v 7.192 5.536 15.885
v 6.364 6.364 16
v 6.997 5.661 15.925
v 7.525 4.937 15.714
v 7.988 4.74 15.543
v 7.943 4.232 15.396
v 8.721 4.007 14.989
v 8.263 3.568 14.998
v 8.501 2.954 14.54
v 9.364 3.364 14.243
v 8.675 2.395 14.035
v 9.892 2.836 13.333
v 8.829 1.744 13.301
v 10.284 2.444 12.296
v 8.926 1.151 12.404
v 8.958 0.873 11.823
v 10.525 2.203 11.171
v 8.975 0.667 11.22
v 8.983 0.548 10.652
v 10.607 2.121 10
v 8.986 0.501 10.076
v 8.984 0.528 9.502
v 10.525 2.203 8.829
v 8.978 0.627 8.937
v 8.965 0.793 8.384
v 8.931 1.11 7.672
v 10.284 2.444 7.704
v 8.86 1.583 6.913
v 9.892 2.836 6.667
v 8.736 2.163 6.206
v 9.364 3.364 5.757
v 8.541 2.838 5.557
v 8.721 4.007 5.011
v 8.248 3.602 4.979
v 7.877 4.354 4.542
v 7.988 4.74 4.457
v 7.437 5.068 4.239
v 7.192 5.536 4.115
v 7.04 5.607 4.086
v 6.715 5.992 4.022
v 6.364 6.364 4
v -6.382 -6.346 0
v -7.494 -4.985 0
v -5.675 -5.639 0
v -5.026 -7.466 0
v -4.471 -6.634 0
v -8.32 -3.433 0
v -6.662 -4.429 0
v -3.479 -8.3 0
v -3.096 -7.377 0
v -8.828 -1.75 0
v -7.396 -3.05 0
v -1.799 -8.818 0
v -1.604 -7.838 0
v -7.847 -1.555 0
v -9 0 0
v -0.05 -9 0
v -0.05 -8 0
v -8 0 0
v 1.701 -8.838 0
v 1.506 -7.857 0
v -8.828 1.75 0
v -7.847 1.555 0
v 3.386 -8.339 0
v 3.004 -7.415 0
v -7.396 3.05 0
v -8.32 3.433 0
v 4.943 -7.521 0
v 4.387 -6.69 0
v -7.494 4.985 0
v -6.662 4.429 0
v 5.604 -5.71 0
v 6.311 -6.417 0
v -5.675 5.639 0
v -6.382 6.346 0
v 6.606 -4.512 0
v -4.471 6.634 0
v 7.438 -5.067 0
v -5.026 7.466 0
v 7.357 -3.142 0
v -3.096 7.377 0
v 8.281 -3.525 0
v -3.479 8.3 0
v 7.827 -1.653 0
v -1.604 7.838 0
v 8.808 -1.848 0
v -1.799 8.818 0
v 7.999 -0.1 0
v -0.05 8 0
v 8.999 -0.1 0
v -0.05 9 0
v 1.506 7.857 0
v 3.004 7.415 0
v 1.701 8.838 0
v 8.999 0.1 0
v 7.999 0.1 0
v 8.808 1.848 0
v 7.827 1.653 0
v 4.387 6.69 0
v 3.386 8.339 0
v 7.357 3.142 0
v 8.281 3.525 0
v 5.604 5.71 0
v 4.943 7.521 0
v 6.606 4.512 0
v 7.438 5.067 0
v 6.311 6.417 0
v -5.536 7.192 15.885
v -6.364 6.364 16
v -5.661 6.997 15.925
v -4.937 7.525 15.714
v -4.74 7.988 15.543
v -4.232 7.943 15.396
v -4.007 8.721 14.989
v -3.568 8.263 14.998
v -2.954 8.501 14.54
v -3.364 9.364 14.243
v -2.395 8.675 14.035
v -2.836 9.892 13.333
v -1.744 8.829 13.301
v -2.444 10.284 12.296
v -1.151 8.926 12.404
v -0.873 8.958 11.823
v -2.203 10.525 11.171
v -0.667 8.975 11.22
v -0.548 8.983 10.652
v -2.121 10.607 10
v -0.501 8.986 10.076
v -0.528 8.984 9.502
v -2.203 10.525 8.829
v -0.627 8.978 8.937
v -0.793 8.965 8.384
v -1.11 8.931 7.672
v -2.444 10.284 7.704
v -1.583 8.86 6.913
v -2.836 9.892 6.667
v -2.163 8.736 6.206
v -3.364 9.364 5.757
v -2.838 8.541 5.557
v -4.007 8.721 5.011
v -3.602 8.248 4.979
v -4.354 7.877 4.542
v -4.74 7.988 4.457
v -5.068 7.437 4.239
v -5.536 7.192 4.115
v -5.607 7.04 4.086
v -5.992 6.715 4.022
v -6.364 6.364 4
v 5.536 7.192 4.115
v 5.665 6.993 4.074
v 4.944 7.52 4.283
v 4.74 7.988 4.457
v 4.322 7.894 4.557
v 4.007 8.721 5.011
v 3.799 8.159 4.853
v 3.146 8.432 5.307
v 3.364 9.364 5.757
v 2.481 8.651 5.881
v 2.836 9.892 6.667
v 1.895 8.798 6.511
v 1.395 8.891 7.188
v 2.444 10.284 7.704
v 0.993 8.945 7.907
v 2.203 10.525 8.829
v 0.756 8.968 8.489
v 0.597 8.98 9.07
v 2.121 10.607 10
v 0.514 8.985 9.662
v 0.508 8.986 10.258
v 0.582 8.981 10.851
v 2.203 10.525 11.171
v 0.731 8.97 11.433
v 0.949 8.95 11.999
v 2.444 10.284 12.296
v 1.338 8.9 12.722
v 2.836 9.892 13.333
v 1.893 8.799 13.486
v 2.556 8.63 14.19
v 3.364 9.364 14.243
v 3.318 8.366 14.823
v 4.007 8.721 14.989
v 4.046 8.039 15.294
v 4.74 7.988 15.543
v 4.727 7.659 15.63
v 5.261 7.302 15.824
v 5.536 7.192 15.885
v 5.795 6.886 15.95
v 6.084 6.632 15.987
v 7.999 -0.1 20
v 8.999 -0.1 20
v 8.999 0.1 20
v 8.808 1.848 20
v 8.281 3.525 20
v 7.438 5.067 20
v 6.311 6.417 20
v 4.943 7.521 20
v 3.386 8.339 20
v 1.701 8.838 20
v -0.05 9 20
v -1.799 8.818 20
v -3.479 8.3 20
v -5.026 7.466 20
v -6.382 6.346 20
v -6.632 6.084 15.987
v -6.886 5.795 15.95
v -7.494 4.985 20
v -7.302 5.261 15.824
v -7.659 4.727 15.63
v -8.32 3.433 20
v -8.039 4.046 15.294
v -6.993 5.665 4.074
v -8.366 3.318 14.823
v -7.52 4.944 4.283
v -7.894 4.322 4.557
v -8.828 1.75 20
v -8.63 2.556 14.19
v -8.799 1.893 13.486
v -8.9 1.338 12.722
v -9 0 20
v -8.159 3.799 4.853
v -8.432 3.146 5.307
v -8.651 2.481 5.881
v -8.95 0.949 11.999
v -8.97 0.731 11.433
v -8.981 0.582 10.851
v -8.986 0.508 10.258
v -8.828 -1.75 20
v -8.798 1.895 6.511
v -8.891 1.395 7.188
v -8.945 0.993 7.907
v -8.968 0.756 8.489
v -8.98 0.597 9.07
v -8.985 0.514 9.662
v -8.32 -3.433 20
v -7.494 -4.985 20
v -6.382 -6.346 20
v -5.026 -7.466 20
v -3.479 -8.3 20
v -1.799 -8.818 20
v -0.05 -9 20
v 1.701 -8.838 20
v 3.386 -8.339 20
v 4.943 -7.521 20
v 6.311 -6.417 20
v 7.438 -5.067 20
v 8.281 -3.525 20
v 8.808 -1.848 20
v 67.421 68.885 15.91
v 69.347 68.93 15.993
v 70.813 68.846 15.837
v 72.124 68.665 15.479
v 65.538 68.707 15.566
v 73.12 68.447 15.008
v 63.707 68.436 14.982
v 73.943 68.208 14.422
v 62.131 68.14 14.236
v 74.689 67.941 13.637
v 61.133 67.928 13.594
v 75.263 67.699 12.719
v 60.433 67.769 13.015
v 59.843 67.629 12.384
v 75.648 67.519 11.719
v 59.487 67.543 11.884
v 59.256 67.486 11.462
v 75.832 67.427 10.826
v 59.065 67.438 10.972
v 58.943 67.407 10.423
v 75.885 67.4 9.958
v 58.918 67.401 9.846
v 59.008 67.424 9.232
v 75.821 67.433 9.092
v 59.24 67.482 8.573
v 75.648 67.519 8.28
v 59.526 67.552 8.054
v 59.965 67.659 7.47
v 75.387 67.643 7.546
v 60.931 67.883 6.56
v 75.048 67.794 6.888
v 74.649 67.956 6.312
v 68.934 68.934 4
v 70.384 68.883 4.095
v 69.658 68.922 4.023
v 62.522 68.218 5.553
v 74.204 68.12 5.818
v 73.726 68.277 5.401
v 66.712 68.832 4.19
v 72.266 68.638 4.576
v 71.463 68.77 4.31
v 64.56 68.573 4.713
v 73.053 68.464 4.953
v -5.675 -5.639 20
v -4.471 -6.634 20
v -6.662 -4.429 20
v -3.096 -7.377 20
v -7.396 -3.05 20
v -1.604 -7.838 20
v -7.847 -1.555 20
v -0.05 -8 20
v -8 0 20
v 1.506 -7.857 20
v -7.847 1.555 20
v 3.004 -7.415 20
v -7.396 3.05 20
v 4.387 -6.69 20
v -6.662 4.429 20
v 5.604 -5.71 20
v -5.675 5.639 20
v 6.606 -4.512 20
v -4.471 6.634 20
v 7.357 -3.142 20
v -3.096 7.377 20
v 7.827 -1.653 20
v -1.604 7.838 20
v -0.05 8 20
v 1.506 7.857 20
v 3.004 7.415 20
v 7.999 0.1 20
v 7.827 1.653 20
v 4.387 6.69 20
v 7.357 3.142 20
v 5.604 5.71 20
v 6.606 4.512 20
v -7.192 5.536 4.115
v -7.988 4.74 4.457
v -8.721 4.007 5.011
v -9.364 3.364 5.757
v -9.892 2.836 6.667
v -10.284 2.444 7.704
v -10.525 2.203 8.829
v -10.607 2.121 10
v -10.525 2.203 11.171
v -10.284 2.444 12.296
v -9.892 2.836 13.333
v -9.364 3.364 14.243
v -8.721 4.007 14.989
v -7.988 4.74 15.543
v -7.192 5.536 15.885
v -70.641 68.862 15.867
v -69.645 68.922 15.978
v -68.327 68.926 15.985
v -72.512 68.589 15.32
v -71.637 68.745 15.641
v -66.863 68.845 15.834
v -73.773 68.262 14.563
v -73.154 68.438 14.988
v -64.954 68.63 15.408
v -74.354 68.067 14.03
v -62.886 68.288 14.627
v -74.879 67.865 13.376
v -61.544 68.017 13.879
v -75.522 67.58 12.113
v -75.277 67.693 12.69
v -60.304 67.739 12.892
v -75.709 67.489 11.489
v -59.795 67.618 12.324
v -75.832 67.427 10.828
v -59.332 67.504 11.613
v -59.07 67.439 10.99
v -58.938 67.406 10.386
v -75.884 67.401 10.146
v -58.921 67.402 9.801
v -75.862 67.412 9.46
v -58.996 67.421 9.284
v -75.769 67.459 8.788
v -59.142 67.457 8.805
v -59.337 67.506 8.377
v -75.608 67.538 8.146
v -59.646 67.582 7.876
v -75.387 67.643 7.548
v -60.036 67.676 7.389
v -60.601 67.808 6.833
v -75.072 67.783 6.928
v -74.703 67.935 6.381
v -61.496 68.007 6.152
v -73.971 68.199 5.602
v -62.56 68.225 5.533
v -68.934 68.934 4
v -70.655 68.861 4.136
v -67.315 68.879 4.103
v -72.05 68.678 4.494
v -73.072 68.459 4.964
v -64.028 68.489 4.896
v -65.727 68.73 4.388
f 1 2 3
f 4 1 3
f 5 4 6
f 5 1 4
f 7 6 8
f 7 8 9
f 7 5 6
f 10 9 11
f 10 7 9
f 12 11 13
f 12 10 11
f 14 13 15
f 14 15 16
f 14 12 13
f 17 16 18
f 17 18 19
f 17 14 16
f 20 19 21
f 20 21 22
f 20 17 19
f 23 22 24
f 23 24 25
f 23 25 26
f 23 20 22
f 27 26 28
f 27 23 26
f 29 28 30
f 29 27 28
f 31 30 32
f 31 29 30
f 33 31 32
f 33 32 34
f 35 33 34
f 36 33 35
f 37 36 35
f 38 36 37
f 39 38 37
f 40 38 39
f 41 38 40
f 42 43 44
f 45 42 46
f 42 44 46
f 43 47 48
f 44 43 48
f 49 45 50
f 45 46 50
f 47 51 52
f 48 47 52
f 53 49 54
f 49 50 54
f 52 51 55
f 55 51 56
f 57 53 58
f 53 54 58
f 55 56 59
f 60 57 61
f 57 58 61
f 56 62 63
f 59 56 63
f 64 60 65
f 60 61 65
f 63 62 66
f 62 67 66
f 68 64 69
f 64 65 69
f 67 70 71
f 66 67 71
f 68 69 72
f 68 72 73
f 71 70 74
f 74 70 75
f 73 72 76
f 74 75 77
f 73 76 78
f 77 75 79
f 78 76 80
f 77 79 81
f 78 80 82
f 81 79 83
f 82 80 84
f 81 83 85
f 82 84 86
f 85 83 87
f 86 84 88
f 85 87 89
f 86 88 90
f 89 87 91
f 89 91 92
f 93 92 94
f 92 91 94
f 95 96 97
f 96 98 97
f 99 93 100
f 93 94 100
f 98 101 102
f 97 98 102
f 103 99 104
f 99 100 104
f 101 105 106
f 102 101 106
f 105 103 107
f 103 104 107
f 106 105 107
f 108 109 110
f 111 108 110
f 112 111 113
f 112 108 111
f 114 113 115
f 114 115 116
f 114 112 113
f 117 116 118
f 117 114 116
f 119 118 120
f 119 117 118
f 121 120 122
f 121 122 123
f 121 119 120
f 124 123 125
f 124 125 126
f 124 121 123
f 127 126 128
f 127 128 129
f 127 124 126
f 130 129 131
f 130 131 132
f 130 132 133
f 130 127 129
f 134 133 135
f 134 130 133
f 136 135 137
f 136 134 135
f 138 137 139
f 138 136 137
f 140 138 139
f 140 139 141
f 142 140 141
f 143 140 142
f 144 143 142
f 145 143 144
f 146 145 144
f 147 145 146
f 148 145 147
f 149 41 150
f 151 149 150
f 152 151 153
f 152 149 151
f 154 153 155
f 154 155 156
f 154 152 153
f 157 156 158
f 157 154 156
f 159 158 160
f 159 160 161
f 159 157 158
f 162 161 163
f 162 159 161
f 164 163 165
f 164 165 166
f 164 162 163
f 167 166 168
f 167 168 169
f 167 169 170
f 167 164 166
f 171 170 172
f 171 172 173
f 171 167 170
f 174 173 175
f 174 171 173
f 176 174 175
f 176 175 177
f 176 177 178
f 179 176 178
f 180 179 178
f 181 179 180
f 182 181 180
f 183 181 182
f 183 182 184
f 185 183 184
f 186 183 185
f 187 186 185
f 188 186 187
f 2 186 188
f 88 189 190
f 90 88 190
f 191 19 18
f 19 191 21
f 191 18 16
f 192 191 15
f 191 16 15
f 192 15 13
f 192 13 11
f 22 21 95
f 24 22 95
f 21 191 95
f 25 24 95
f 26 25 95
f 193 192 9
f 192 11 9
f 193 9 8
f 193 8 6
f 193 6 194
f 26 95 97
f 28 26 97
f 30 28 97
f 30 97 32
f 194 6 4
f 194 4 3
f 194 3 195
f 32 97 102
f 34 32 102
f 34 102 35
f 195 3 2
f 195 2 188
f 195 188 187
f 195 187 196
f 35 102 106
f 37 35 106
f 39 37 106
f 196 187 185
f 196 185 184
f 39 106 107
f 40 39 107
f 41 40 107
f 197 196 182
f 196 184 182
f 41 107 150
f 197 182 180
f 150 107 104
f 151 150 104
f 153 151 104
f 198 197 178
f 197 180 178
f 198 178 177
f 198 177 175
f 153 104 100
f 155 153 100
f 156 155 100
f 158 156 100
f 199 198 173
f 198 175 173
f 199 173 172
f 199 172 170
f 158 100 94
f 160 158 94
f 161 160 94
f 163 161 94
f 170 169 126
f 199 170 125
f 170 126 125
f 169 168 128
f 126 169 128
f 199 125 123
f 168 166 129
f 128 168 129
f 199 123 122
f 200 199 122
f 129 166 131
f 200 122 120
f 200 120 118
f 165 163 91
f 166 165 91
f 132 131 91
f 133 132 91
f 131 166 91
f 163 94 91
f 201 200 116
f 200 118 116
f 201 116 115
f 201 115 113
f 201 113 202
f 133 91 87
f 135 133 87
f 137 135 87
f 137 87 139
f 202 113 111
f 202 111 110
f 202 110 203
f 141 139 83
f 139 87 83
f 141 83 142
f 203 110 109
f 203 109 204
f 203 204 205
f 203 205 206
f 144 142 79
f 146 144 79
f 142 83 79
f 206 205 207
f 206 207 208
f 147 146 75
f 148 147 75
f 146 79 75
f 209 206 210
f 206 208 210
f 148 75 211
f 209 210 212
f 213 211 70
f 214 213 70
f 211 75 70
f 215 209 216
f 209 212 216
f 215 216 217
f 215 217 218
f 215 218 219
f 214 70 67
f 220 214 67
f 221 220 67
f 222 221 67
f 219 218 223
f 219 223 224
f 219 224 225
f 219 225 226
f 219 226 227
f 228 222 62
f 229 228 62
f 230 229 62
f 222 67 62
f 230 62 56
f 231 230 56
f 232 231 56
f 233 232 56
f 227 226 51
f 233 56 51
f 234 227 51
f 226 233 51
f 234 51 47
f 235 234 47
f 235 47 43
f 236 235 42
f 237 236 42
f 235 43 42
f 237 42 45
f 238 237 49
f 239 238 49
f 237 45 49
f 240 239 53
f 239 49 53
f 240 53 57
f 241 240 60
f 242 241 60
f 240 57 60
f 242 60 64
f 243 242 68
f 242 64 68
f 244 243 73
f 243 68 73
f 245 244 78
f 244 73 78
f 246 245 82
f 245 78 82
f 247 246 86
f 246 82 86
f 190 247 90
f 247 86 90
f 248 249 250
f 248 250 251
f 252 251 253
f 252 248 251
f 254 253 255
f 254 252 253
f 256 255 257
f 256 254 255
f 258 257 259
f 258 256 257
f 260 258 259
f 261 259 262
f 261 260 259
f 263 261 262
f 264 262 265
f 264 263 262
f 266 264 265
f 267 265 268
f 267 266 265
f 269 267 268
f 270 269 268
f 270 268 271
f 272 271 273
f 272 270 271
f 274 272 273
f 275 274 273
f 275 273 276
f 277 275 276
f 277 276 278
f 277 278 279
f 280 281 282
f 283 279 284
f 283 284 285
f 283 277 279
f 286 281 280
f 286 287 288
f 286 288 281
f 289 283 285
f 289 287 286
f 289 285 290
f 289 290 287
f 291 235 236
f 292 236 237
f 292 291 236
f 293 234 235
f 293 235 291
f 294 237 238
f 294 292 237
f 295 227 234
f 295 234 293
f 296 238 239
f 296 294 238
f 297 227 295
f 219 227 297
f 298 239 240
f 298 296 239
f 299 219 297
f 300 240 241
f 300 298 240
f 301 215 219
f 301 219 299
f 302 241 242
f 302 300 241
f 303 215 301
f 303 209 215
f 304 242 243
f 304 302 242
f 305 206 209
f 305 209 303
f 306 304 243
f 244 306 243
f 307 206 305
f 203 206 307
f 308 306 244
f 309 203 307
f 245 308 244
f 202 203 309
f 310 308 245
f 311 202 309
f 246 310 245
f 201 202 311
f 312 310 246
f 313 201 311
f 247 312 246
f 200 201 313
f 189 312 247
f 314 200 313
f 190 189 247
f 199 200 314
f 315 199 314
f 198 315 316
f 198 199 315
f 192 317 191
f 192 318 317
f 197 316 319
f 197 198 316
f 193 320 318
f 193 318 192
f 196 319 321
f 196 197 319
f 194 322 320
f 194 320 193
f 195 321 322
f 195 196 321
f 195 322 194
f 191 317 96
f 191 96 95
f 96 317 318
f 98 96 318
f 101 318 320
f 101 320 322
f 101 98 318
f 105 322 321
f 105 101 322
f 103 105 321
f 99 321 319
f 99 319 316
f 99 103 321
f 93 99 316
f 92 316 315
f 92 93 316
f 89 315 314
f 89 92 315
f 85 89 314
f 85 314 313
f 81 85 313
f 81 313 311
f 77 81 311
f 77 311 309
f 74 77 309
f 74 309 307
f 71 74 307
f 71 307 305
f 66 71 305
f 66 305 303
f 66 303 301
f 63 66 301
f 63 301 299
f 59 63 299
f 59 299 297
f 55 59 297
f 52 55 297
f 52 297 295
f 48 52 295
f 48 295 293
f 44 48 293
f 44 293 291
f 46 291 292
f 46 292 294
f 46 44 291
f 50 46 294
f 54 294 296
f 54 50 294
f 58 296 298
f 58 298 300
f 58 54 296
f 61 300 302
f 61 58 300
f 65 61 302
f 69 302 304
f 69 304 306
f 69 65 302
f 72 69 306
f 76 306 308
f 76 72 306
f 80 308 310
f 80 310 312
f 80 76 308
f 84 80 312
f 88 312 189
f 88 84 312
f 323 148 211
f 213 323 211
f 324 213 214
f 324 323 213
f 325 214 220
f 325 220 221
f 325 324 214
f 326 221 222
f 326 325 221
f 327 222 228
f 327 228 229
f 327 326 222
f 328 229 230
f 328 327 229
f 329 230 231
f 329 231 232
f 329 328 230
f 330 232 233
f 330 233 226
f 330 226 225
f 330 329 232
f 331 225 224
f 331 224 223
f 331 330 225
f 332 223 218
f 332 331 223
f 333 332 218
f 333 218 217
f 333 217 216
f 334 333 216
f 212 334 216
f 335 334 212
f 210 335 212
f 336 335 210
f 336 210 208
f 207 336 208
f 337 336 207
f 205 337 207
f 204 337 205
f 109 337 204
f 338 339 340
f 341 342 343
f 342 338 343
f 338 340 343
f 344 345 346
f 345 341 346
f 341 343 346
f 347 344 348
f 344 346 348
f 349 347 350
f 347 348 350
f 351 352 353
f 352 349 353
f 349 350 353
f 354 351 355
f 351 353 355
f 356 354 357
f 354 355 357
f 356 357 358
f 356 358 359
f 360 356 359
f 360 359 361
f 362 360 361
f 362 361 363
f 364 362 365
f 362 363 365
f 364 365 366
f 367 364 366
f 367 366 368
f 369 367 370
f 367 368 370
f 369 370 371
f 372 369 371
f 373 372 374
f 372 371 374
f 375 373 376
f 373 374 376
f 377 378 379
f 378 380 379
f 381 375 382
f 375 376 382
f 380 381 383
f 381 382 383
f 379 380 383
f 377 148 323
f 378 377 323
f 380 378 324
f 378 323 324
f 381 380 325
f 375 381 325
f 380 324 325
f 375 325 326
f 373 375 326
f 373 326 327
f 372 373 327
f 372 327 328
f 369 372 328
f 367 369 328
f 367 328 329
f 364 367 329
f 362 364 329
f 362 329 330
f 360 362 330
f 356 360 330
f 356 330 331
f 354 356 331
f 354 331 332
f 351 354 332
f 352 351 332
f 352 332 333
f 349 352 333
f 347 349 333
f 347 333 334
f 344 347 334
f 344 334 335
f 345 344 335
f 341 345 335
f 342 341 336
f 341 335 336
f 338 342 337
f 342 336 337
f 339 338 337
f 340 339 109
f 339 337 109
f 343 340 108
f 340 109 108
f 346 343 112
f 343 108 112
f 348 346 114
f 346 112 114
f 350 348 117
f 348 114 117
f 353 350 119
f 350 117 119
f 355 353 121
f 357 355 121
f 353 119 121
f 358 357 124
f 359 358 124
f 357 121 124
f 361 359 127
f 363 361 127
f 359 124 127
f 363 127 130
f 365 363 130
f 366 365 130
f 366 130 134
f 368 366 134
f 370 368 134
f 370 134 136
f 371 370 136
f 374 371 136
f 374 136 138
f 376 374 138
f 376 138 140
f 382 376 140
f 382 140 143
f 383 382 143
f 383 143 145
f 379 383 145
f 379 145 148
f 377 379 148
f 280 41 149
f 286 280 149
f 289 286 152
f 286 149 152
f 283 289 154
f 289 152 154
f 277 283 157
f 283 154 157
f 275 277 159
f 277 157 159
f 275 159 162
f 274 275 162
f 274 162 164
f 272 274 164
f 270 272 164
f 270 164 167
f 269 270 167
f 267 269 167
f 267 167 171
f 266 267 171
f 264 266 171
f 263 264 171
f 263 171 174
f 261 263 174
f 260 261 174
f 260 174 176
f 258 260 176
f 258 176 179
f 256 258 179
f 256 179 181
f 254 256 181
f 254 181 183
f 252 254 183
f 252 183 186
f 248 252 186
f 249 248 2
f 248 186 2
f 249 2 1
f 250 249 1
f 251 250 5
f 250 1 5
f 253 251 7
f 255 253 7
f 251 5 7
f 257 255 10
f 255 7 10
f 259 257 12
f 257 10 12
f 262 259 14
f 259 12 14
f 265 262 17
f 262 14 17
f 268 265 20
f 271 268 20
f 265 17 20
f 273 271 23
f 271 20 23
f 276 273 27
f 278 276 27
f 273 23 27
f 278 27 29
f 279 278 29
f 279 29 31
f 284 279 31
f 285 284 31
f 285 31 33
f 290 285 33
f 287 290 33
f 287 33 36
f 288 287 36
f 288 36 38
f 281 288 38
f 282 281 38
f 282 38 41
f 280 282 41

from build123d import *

# Parameters (mm, degrees)
SKETCH9_R                       = 9
SKETCH9_R_2                     = 8
BOSS_EXTRUDE1_DEPTH             = 20
SKETCH10_W                      = 4.934959926
SKETCH10_H                      = 0.2
CUT_EXTRUDE1_DEPTH              = 20
SKETCH11_R                      = 6
BOSS_EXTRUDE2_DEPTH             = 100
BOSS_EXTRUDE2_DIRECTION_2_REACH = 23.728
SKETCH12_R                      = 6
BOSS_EXTRUDE3_DEPTH             = 100
BOSS_EXTRUDE3_DIRECTION_2_REACH = 74.864
SKETCH14_R                      = 12.5
CUT_EXTRUDE3_DEPTH              = 82.317279836
CUT_EXTRUDE3_DEPTH_BACK         = 82.317279836


with BuildPart() as part:
    # Sketch9 → Boss-Extrude1 (new body)
    with BuildSketch(Plane.XY):
        Circle(SKETCH9_R)
        Circle(SKETCH9_R_2, mode=Mode.SUBTRACT)
    extrude(amount=BOSS_EXTRUDE1_DEPTH)

    # Sketch10 → Cut-Extrude1 (cut)
    with BuildSketch(Plane.XY.offset(20)):
        with Locations((8, 0)):
            Rectangle(SKETCH10_W, SKETCH10_H)
    extrude(amount=-CUT_EXTRUDE1_DEPTH, mode=Mode.SUBTRACT)

    # Sketch11 → Boss-Extrude2 (add)
    with BuildSketch(Plane(origin=(-6.363961031, 6.363961031, 0), x_dir=(0, 0, -1), z_dir=(-0.707106781, 0.707106781, 0))):
        with Locations((-10, 0)):
            Circle(SKETCH11_R)
    extrude(amount=BOSS_EXTRUDE2_DEPTH)

    # Sketch11 → Boss-Extrude2 direction 2 (add, up to next)
    with BuildSketch(Plane(origin=(-6.363961031, 6.363961031, 0), x_dir=(0, 0, -1), z_dir=(-0.707106781, 0.707106781, 0)), mode=Mode.PRIVATE) as boss_extrude2_direction_2_sk1:
        with Locations((-10, 0)):
            Circle(SKETCH11_R)
    boss_extrude2_direction_2_tool1 = extrude(boss_extrude2_direction_2_sk1.sketch, amount=-BOSS_EXTRUDE2_DIRECTION_2_REACH, mode=Mode.PRIVATE) - part.part
    add(boss_extrude2_direction_2_tool1.solids().sort_by_distance((-6.363961, 6.363961, 10))[0])
    add(boss_extrude2_direction_2_tool1.solids().sort_by_distance((-6.363961, 6.363961, 10))[1])

    # Sketch12 → Boss-Extrude3 (add)
    with BuildSketch(Plane(origin=(6.363961031, 6.363961031, 0), x_dir=(0, 0, -1), z_dir=(0.707106781, 0.707106781, 0))):
        with Locations((-10, 0)):
            Circle(SKETCH12_R)
    extrude(amount=BOSS_EXTRUDE3_DEPTH)

    # Sketch12 → Boss-Extrude3 direction 2 (add, up to next)
    with BuildSketch(Plane(origin=(6.363961031, 6.363961031, 0), x_dir=(0, 0, -1), z_dir=(0.707106781, 0.707106781, 0)), mode=Mode.PRIVATE) as boss_extrude3_direction_2_sk1:
        with Locations((-10, 0)):
            Circle(SKETCH12_R)
    boss_extrude3_direction_2_tool1 = extrude(boss_extrude3_direction_2_sk1.sketch, amount=-BOSS_EXTRUDE3_DIRECTION_2_REACH, mode=Mode.PRIVATE) - part.part
    add(boss_extrude3_direction_2_tool1.solids().sort_by_distance((6.363961, 6.363961, 10))[0])
    add(boss_extrude3_direction_2_tool1.solids().sort_by_distance((6.363961, 6.363961, 10))[1])

    # Sketch14 → Cut-Extrude3 (cut, two sides)
    with BuildSketch(Plane(origin=(0, 0, 0), x_dir=(0, 0, -1), z_dir=(1, 0, 0))) as cut_extrude3_sk:
        with Locations((-10, 79.9)):
            Circle(SKETCH14_R)
    extrude(amount=CUT_EXTRUDE3_DEPTH, mode=Mode.SUBTRACT)
    extrude(cut_extrude3_sk.sketch, amount=-CUT_EXTRUDE3_DEPTH_BACK, mode=Mode.SUBTRACT)


solid = part.part
